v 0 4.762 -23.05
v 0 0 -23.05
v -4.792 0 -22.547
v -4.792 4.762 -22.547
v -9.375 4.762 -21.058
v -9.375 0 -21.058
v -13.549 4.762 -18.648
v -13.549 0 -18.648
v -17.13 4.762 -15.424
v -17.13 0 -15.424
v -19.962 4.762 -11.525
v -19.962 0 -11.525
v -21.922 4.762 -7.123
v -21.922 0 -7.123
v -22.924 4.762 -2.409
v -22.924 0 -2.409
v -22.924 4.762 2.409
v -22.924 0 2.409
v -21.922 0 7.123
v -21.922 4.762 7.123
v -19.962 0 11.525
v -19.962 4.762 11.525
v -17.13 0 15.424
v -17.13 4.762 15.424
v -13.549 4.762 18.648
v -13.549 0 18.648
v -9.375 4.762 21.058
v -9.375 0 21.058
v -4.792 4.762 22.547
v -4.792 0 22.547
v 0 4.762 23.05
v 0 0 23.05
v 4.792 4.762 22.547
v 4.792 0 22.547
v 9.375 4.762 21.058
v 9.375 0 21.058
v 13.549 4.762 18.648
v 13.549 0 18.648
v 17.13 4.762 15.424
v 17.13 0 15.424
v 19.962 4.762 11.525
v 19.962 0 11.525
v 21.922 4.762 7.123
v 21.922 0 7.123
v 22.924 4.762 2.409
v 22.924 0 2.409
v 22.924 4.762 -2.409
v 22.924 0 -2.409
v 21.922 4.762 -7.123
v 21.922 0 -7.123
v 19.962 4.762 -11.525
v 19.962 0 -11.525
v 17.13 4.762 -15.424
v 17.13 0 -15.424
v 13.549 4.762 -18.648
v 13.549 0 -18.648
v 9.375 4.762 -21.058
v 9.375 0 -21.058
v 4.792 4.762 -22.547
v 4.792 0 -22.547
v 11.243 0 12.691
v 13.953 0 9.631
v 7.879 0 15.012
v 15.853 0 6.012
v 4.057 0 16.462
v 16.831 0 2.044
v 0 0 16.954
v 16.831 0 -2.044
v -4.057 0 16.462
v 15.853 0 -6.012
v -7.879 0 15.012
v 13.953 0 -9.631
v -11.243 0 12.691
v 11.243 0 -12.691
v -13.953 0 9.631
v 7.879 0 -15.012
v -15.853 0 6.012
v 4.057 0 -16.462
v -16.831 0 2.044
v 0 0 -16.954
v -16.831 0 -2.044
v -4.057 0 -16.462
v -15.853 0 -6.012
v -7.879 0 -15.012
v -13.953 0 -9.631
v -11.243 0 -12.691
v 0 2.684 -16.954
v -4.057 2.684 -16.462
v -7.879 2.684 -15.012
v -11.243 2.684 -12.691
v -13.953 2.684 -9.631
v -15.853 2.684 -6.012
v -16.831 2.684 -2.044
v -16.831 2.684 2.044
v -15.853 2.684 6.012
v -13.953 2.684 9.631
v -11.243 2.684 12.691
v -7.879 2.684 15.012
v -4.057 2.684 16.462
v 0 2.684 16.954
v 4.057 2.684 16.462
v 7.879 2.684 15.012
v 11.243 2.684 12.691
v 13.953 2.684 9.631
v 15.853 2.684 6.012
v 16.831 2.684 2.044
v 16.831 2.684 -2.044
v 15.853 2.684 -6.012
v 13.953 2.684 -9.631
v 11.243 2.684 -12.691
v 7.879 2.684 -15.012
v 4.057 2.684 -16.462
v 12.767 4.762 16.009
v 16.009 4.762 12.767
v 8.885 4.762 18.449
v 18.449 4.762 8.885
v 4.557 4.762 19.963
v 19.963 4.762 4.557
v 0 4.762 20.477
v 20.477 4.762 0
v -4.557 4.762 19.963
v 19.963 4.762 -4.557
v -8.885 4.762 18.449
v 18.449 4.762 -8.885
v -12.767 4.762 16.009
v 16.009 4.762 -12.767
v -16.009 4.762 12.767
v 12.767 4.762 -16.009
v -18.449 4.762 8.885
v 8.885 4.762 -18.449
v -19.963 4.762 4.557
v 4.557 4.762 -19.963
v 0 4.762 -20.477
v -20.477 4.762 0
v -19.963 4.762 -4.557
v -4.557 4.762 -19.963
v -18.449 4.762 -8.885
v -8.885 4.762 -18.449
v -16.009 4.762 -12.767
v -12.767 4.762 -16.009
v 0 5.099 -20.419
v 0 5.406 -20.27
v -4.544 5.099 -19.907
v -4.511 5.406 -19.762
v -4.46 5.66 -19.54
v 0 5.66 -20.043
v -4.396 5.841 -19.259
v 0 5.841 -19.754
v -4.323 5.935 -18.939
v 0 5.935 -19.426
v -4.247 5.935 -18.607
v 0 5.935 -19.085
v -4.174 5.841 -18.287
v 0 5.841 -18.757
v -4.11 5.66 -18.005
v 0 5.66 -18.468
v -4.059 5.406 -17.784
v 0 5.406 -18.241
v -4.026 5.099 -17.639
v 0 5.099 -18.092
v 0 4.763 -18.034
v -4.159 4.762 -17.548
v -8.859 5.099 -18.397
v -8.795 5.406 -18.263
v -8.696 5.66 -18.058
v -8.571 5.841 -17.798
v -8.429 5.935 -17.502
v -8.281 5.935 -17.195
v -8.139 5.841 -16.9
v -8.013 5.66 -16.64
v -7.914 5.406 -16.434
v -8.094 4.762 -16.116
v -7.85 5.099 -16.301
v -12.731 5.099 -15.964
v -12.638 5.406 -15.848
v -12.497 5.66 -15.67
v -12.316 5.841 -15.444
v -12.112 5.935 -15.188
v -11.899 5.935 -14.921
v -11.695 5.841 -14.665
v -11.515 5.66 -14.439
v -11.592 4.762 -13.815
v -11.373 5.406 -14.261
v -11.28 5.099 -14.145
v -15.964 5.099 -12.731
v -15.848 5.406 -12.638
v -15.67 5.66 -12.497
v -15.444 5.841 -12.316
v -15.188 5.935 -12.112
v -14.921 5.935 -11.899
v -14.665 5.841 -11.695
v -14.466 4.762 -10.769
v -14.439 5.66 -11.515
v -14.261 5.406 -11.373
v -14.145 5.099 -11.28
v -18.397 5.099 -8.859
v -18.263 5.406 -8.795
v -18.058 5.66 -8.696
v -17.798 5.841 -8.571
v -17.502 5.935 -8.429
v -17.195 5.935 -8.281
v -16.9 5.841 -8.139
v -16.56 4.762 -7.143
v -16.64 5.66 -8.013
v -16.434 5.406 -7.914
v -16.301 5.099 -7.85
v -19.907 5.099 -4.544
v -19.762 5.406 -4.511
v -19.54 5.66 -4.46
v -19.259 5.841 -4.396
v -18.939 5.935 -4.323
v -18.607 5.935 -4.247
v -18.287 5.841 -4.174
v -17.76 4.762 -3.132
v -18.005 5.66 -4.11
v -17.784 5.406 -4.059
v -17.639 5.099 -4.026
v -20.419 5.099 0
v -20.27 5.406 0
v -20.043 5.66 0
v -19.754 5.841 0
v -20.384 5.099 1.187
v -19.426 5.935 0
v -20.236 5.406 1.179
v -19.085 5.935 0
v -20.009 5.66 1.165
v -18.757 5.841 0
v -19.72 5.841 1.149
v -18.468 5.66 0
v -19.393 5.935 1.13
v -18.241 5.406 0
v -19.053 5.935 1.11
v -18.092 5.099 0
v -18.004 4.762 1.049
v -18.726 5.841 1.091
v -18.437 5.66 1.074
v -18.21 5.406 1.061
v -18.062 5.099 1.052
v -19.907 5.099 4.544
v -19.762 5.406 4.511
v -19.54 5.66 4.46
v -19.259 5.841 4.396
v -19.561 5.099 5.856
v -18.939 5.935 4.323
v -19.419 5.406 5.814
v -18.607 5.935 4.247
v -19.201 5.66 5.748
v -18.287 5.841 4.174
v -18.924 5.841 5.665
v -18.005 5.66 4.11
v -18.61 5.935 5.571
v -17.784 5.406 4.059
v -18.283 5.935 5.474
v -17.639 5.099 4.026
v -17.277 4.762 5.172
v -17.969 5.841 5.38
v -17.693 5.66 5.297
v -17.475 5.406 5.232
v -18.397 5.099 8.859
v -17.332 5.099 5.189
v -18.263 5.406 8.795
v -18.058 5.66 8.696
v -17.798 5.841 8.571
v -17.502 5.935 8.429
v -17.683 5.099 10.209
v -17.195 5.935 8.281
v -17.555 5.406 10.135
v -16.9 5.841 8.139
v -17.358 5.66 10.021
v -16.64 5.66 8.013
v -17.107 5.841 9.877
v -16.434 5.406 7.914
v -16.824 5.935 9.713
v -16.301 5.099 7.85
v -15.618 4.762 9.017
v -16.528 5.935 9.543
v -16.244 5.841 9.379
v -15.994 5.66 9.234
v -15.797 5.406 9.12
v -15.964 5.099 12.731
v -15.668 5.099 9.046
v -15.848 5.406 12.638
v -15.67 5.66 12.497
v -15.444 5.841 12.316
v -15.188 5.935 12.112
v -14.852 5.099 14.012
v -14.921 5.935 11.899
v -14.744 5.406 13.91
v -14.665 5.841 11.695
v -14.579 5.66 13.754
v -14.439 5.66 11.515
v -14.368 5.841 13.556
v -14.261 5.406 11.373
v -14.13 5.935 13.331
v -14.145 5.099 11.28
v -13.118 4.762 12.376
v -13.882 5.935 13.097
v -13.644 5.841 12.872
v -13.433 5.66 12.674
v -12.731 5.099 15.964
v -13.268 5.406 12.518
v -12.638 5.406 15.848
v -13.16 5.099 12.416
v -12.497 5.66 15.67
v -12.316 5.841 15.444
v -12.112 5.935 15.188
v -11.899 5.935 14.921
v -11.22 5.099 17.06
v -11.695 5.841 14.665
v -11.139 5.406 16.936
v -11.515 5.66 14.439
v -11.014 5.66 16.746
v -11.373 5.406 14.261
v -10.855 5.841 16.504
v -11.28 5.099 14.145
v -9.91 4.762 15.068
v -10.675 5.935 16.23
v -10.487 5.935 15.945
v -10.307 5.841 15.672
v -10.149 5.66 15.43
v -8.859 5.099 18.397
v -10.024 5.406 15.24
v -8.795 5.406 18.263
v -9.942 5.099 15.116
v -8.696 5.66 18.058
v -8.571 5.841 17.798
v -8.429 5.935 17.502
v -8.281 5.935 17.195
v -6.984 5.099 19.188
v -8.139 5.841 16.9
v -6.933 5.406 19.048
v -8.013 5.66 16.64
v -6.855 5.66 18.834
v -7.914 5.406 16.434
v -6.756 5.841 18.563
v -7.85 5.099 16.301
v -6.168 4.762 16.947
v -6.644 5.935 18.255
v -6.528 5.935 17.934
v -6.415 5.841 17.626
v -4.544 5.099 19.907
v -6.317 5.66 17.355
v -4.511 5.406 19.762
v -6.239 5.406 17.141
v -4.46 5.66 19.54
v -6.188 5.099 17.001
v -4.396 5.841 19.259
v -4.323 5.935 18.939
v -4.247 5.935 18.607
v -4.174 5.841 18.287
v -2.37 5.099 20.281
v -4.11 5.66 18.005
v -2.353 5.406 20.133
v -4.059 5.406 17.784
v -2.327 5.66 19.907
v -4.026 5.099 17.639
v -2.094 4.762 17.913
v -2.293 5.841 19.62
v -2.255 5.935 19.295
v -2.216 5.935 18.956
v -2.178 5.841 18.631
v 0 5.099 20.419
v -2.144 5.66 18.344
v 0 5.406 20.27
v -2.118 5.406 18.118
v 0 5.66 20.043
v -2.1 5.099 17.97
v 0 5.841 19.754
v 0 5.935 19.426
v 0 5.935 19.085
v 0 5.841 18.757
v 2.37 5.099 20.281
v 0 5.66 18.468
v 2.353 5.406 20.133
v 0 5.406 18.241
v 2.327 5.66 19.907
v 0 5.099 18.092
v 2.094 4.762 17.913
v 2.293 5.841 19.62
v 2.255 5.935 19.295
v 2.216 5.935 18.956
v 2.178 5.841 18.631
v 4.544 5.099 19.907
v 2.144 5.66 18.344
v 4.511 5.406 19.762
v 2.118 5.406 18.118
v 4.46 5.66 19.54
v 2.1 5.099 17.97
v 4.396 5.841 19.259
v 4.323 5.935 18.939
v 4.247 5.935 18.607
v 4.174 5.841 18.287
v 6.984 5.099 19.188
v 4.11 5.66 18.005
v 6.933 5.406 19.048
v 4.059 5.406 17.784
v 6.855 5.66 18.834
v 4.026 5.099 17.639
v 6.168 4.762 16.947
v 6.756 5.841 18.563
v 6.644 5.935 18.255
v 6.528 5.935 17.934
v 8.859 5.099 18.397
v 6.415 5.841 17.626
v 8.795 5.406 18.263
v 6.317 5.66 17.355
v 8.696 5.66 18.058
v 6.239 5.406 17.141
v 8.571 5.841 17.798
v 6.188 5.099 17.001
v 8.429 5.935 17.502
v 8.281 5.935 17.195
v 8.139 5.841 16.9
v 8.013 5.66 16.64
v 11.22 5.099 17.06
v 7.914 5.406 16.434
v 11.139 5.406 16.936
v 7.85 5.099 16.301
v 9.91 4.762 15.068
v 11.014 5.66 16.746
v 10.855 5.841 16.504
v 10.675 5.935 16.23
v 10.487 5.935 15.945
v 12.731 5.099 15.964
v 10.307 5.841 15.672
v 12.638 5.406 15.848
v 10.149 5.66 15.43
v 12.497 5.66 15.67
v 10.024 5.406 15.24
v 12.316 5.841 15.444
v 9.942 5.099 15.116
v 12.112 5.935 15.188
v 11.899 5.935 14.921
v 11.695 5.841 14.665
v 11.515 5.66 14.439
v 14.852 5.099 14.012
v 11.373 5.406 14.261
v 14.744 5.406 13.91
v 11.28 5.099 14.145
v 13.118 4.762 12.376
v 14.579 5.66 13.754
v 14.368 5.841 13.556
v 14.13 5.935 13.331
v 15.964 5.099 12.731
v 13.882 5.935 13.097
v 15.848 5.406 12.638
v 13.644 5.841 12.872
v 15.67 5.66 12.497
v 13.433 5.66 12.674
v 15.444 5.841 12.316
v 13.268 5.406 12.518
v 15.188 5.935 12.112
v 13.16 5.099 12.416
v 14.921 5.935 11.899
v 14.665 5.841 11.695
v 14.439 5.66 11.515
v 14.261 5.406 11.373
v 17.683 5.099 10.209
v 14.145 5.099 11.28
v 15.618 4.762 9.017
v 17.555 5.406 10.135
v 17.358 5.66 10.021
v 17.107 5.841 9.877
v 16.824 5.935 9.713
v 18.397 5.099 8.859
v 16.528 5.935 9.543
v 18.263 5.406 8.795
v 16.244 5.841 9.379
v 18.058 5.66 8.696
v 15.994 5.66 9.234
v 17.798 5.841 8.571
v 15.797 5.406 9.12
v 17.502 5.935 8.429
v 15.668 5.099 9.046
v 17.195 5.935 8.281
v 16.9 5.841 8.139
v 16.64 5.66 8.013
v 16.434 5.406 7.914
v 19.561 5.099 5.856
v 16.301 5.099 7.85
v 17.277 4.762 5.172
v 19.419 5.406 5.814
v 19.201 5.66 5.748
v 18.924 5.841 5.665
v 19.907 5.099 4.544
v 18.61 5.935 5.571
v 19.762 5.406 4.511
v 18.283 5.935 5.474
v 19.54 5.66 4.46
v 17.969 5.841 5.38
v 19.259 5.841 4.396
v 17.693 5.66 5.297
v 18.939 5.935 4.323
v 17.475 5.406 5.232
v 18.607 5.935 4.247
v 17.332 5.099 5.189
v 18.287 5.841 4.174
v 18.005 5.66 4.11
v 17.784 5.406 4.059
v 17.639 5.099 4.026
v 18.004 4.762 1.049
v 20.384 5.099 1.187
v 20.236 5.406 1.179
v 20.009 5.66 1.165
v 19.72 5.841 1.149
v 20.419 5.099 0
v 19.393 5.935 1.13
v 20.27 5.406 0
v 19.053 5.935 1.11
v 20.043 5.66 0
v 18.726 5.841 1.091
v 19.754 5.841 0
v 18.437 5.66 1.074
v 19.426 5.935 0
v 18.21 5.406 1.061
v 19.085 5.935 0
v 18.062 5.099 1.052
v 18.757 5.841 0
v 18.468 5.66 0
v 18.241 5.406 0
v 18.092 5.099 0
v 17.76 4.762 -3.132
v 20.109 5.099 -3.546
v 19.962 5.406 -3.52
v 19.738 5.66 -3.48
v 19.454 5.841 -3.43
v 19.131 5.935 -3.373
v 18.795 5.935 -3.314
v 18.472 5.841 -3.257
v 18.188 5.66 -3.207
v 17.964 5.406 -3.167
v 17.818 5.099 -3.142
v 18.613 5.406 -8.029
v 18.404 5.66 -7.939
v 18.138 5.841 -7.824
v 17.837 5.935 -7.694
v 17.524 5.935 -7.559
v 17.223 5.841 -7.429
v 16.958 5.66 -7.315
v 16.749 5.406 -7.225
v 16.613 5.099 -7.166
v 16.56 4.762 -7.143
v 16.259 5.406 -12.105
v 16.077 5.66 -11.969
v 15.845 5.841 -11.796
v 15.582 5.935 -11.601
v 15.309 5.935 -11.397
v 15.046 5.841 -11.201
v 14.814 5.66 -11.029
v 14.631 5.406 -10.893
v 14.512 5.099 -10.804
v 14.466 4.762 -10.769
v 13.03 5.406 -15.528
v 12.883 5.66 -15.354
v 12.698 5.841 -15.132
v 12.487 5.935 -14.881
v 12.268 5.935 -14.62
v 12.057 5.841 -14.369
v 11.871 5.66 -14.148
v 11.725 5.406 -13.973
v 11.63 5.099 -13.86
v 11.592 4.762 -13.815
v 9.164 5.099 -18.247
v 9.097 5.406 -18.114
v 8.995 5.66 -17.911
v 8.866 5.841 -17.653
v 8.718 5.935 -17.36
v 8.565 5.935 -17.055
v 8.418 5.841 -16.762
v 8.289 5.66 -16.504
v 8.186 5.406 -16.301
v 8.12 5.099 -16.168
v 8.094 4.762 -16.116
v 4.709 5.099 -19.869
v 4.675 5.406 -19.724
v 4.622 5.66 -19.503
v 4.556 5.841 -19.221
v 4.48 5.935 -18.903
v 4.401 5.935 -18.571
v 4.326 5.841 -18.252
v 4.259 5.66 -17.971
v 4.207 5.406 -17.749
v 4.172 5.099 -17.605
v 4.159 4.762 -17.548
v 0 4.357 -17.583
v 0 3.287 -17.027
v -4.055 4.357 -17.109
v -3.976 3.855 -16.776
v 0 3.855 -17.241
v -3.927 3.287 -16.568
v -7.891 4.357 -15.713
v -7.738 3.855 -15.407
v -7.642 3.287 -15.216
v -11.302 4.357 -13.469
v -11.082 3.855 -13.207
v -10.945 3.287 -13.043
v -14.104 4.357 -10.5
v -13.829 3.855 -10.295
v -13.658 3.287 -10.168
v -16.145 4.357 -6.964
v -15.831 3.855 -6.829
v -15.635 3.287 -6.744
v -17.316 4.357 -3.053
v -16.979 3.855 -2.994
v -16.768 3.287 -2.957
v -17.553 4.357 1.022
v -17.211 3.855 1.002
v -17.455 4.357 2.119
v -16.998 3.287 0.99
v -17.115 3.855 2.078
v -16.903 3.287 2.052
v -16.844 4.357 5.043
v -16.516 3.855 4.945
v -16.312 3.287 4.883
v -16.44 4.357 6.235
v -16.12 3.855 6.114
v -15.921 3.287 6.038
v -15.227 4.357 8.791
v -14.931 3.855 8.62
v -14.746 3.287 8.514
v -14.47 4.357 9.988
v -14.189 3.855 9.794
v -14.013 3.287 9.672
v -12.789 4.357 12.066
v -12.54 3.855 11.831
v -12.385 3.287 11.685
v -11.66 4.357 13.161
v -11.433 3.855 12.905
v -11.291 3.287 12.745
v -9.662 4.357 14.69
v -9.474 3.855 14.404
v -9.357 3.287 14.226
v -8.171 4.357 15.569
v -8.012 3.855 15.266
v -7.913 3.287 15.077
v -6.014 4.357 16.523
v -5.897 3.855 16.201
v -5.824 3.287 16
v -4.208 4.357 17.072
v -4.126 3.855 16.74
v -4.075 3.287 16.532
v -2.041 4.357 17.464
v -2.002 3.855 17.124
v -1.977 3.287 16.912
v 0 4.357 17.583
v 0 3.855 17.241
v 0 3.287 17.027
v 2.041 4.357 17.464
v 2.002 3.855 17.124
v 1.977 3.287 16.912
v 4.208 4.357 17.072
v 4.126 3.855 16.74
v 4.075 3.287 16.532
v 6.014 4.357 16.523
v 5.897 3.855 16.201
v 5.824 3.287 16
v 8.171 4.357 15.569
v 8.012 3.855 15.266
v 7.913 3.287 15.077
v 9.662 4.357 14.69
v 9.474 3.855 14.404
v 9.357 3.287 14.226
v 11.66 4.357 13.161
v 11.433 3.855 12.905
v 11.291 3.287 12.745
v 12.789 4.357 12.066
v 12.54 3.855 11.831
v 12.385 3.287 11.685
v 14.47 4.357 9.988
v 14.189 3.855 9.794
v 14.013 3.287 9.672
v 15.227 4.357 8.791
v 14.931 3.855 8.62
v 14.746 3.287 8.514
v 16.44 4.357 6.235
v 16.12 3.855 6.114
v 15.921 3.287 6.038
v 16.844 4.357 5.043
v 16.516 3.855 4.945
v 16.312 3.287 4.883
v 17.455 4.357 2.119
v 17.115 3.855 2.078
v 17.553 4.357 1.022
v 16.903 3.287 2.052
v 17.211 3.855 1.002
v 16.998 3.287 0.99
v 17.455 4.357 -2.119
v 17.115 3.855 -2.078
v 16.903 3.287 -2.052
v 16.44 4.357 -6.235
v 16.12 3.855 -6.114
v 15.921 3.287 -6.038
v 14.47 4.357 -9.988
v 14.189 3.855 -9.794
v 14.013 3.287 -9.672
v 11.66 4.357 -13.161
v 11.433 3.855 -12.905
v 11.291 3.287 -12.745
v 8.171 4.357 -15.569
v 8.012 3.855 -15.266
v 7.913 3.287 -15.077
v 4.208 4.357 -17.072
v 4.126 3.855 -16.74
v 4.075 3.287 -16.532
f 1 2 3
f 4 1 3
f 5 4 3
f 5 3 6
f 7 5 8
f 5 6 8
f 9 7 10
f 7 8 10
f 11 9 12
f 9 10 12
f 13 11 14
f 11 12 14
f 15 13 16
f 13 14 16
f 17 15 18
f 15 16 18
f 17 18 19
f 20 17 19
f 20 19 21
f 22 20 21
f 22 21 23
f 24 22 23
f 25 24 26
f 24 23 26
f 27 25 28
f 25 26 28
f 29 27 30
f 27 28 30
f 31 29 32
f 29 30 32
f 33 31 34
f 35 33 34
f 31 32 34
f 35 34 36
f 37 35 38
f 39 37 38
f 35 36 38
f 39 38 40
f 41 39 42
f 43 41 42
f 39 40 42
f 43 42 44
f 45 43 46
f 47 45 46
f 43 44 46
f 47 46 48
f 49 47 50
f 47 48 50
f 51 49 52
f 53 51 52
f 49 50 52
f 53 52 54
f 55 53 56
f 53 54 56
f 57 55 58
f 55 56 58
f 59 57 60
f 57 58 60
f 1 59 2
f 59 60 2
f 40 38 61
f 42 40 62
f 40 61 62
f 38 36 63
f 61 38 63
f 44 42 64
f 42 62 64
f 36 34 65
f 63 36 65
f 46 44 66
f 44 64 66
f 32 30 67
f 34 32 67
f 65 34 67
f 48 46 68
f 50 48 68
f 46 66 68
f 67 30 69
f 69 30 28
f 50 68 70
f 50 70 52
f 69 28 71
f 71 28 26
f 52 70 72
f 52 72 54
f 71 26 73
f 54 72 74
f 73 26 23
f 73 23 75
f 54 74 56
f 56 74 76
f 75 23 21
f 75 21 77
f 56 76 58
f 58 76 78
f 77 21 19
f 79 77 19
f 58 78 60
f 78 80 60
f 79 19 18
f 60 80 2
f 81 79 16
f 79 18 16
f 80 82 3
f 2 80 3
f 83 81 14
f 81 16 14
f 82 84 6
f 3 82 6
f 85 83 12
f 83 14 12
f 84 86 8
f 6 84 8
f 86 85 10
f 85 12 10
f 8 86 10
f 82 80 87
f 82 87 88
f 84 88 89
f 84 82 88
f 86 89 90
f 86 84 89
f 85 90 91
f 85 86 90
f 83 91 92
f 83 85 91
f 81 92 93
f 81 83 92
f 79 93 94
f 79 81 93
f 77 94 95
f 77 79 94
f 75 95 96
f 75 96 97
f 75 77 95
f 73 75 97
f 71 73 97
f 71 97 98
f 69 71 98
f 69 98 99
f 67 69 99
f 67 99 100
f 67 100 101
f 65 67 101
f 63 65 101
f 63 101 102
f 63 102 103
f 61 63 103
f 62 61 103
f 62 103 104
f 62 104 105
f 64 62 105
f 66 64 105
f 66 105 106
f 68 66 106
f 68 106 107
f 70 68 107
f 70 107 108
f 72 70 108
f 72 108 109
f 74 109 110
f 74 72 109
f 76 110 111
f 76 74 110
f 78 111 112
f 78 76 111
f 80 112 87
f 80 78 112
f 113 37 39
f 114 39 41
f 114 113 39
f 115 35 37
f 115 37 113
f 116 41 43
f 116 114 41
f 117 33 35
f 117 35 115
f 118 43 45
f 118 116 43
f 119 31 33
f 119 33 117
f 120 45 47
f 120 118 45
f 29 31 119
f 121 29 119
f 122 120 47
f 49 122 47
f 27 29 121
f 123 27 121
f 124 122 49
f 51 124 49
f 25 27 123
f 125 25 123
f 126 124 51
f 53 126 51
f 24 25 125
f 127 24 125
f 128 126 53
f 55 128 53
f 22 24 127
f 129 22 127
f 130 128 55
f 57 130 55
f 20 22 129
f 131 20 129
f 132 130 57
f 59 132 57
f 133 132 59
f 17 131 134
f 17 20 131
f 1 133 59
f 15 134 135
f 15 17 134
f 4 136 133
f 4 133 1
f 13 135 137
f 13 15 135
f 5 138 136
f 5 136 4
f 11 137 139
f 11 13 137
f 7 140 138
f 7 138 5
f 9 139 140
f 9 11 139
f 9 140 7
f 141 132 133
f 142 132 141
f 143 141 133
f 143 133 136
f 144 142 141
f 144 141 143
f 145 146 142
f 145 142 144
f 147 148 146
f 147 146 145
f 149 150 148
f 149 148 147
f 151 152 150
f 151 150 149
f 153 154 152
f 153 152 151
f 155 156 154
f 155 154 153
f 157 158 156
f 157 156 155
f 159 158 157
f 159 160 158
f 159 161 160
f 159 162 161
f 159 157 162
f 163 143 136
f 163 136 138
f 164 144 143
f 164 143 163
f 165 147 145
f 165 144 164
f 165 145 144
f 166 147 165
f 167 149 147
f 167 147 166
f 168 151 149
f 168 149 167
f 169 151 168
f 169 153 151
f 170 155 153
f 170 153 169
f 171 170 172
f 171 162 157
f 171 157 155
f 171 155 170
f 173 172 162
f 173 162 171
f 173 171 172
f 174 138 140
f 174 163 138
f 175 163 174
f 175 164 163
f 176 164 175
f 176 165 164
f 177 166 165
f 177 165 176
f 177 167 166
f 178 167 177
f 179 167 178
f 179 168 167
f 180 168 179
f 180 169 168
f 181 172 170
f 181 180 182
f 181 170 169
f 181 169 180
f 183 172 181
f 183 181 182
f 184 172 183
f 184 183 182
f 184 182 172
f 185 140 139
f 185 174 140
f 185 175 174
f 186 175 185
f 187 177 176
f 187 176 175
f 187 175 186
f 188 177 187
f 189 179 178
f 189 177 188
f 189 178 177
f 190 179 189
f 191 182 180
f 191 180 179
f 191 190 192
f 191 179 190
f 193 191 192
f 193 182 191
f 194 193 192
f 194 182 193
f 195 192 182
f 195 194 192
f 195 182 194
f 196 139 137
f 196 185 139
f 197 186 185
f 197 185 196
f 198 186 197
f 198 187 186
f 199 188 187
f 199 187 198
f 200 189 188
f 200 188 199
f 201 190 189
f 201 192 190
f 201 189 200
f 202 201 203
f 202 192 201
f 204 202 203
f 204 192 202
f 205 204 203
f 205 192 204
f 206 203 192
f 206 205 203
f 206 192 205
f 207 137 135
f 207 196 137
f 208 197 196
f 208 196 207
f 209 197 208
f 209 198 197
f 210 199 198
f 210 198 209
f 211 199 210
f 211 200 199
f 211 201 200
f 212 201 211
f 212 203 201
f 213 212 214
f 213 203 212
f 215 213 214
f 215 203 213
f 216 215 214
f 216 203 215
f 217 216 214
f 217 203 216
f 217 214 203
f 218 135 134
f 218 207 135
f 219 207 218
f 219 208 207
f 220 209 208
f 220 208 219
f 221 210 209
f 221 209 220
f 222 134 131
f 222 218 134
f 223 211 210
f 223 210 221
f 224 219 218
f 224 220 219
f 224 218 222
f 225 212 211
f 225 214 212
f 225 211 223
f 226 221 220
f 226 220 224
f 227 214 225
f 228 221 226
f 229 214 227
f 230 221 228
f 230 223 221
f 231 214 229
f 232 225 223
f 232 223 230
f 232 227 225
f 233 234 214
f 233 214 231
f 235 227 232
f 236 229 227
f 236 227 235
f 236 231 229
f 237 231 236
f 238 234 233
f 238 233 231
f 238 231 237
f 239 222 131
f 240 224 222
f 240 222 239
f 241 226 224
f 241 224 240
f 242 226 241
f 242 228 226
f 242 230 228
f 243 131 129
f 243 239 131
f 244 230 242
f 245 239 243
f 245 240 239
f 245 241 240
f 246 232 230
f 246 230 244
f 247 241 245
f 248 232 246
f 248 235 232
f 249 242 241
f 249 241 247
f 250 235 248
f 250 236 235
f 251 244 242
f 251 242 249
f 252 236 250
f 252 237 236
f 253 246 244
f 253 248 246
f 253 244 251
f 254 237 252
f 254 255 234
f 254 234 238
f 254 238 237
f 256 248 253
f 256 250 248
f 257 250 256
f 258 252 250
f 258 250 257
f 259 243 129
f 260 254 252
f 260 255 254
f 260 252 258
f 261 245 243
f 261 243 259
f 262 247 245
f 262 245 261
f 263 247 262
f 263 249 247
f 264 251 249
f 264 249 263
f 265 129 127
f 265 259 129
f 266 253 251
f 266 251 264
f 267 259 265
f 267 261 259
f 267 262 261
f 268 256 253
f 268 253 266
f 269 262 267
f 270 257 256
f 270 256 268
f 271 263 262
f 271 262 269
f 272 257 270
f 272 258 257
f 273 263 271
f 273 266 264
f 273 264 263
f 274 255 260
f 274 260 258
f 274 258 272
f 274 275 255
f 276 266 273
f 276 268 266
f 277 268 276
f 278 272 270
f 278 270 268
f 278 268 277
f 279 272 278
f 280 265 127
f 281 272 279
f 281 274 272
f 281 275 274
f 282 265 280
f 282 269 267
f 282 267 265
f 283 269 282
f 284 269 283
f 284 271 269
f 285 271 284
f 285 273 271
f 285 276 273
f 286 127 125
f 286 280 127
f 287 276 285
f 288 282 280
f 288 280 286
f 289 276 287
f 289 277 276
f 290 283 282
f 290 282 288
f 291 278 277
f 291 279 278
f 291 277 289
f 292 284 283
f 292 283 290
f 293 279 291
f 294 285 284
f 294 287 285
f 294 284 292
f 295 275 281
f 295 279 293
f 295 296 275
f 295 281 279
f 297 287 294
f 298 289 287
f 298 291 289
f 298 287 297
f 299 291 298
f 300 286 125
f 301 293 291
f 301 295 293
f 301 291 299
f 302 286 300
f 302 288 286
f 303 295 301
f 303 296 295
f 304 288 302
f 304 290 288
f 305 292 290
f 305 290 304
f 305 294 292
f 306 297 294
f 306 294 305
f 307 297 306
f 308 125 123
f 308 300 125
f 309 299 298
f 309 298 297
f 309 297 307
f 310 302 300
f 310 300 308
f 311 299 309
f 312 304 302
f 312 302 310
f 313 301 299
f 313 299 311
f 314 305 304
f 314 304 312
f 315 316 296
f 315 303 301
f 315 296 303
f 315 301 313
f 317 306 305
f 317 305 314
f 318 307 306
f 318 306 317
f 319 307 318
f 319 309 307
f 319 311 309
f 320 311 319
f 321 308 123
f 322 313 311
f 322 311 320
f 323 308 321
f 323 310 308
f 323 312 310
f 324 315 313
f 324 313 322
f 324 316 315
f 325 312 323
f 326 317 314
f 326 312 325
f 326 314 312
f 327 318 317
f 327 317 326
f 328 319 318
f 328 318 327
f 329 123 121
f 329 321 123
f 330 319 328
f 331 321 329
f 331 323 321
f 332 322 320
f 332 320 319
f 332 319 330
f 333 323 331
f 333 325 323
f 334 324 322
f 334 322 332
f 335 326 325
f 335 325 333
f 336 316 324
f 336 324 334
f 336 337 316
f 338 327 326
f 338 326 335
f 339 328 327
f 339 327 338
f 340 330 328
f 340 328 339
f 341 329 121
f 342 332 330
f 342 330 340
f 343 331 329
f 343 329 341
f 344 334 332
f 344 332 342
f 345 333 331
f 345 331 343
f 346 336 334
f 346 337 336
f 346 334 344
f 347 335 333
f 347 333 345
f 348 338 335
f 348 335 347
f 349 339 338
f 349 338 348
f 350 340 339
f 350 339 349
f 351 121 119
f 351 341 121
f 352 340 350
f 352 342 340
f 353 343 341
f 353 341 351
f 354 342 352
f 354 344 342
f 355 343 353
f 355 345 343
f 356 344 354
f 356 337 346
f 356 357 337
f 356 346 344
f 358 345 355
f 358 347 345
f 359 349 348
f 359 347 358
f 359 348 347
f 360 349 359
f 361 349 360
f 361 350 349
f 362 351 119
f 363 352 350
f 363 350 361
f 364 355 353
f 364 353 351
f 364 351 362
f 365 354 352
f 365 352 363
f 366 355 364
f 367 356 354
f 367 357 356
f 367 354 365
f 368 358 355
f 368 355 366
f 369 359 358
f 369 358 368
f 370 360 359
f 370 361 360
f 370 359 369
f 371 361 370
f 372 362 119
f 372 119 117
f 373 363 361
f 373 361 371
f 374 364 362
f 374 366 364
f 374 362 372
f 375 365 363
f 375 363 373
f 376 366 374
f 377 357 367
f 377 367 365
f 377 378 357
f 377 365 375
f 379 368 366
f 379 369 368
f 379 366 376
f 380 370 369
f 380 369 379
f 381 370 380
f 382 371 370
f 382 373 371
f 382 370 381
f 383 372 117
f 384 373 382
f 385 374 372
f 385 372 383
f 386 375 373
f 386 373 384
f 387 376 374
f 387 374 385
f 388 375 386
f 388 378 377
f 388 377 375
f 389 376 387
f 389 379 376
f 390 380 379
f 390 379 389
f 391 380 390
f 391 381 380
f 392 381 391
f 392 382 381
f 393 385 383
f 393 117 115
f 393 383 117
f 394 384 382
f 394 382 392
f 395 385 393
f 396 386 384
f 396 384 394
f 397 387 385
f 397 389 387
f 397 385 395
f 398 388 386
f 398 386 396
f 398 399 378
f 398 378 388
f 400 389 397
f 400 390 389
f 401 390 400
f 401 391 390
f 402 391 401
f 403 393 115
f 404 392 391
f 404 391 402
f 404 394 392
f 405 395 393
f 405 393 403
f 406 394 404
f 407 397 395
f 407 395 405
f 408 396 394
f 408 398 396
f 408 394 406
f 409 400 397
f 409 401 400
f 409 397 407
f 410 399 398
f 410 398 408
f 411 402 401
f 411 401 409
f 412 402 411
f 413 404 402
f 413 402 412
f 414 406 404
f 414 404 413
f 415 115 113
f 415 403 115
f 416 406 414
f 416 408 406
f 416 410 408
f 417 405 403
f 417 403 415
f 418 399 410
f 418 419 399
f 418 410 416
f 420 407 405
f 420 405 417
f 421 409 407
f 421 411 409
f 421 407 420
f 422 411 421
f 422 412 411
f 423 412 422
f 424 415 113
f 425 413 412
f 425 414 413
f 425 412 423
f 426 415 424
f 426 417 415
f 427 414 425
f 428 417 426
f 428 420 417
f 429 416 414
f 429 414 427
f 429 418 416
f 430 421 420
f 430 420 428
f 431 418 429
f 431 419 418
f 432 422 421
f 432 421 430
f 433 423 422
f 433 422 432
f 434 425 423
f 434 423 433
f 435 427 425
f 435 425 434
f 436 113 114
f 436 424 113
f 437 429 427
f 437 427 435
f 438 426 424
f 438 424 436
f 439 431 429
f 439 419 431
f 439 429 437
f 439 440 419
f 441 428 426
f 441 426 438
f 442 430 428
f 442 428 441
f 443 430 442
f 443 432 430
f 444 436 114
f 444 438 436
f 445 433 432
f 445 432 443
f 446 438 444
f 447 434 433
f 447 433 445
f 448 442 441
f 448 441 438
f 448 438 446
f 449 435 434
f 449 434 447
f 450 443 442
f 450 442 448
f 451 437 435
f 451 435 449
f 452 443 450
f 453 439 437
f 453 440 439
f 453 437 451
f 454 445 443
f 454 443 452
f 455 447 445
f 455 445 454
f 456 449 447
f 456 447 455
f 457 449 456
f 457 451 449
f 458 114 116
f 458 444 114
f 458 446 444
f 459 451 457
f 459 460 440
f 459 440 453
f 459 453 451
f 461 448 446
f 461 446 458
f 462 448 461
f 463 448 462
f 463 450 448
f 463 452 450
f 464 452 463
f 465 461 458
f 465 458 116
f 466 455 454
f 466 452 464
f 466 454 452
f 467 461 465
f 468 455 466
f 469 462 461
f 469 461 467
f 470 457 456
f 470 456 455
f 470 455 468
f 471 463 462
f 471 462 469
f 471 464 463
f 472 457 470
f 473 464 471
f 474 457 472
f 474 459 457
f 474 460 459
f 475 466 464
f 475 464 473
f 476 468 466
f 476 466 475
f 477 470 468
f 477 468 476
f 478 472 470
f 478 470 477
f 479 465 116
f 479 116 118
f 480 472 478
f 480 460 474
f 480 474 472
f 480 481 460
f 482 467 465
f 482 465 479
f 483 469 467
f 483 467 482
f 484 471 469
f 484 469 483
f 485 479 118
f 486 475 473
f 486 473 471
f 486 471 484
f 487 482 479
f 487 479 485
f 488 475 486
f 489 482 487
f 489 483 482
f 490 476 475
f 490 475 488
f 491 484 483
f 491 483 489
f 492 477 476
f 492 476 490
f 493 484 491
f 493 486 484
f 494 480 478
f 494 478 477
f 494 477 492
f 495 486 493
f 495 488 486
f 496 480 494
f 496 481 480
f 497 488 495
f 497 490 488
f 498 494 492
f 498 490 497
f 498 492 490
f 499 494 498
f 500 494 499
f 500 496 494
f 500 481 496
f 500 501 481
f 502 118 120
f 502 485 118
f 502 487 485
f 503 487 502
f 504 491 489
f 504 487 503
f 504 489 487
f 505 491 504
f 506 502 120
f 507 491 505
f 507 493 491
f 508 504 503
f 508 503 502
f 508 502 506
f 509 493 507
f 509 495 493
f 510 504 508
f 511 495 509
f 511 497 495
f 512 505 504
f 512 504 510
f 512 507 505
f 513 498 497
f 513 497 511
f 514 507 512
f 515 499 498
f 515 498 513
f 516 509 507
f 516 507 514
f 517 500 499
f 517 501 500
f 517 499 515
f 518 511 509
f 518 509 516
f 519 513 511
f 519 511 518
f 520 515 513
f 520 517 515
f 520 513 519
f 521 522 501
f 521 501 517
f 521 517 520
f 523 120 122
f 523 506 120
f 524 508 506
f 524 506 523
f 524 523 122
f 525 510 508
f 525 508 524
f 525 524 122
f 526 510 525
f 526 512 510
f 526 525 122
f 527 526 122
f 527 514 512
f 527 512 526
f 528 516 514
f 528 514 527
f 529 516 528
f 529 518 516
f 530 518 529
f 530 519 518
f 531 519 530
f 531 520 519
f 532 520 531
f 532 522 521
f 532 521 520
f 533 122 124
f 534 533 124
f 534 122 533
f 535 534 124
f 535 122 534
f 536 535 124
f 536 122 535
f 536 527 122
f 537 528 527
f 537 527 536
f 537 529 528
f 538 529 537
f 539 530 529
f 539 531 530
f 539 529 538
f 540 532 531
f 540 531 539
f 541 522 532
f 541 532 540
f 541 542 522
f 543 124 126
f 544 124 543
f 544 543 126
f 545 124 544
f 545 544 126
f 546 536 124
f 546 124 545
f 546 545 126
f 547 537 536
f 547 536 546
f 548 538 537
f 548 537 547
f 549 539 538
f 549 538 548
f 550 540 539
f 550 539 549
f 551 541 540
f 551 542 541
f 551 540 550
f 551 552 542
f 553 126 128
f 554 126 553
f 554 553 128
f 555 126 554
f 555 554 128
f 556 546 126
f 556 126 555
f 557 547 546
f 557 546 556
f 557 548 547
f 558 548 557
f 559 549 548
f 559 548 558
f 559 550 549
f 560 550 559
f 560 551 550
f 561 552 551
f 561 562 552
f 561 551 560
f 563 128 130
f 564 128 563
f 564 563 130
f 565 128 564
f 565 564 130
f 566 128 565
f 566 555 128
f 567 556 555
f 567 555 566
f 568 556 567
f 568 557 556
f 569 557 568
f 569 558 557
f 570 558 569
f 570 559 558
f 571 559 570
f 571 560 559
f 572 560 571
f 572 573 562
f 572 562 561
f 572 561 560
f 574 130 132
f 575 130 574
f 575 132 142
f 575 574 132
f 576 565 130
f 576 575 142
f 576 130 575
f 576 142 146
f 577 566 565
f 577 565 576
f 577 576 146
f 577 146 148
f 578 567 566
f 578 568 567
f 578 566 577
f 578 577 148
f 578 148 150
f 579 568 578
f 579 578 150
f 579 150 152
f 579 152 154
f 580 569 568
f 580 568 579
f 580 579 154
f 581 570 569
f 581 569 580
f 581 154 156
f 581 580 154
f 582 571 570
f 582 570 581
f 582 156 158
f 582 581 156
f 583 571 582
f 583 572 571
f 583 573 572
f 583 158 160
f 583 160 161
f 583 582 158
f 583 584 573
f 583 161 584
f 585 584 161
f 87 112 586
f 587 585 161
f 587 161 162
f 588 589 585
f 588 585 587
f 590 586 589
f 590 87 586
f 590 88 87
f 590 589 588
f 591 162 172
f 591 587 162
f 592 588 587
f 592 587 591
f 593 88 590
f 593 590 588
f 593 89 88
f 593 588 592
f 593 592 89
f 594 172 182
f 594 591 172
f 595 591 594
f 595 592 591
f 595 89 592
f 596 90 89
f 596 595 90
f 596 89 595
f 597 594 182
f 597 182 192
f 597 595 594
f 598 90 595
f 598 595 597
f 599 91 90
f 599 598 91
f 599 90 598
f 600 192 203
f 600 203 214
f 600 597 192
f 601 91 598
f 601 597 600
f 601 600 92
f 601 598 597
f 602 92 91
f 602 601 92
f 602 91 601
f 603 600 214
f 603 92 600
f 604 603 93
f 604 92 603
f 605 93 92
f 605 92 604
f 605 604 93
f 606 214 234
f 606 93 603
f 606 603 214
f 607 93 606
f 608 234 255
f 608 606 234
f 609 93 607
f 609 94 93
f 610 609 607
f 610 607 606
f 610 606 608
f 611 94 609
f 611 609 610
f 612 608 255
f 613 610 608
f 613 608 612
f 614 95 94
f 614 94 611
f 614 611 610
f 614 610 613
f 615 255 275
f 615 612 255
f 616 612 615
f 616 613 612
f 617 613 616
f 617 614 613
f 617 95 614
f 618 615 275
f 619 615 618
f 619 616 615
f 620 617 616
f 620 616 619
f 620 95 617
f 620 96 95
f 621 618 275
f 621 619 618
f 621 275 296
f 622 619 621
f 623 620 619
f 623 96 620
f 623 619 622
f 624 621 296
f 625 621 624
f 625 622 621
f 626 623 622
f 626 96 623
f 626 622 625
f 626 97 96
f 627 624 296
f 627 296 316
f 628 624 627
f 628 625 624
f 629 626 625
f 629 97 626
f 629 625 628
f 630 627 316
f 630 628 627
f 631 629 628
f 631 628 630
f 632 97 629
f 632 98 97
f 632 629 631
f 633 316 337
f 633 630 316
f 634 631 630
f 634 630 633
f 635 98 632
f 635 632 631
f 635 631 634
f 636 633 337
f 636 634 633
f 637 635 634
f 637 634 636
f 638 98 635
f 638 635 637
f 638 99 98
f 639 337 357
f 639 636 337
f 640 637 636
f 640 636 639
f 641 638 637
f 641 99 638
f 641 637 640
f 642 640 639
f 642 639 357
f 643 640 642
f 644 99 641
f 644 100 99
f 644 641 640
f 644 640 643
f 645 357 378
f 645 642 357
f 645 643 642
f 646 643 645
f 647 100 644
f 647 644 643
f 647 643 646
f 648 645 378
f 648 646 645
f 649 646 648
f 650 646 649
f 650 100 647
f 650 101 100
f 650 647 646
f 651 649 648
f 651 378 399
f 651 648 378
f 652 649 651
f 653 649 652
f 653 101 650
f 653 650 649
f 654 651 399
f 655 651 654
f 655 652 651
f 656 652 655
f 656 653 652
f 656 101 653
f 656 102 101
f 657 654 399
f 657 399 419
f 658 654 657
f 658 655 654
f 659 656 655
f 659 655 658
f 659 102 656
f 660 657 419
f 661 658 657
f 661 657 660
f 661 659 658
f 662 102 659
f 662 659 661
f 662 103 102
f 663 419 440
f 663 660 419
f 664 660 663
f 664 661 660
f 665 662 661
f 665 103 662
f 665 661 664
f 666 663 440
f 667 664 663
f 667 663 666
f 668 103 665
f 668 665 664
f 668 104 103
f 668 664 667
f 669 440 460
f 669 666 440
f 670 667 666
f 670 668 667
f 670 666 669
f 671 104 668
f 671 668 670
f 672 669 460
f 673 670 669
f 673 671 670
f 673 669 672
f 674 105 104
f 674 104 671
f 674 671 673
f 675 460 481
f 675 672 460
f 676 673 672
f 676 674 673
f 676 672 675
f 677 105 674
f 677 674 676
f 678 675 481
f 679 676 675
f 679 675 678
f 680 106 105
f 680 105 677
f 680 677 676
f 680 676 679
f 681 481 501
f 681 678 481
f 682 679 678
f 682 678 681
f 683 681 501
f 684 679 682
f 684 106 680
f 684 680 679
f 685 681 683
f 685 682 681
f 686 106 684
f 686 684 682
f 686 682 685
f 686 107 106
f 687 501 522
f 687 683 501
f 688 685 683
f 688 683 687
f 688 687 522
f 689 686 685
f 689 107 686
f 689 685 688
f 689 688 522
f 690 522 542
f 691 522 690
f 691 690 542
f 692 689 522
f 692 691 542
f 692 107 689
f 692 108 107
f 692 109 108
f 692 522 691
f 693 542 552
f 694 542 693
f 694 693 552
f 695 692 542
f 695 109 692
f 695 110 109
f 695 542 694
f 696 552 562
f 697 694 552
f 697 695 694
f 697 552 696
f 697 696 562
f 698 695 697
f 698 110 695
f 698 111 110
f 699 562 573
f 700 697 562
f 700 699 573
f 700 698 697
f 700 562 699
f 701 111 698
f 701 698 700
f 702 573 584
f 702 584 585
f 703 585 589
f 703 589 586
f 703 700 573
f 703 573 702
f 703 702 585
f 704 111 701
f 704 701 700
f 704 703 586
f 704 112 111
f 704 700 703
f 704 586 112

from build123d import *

# Parameters (mm, degrees)
SKETCH1_R           = 23.0505
SKETCH1_R_2         = 16.9545
BOSS_EXTRUDE1_DEPTH = 4.7625
FILLET1_R           = 2.54


with BuildPart() as part:
    # Sketch1 → Boss-Extrude1 (new body)
    with BuildSketch(Plane(origin=(0, 0, 0), x_dir=(1, 0, 0), z_dir=(0, 1, 0))):
        with Locations(Location((0, 0, 0), (0, 0, 90))):
            Circle(SKETCH1_R)
        with Locations(Location((0, 0, 0), (0, 0, 90))):
            Circle(SKETCH1_R_2, mode=Mode.SUBTRACT)
    extrude(amount=BOSS_EXTRUDE1_DEPTH)

    # Sketch2 → Revolve1 (revolve)
    with BuildSketch(Plane.XY, mode=Mode.PRIVATE) as revolve1_sk:
        with BuildLine():
            Line((18.034, 4.710412046), (20.477314517, 4.739986951))
            ThreePointArc((20.477314517, 4.739986951), (19.240869806, 5.946856757), (18.034, 4.710412046))
        make_face()
    revolve(revolve1_sk.sketch.rotate(Axis((0, 0, 0), (0, 1, 0)), 90), axis=Axis((0, 0, 0), (0, 1, 0)))

    # Fillet1
    # the kernel refuses this fillet: 2.54 mm, written as the material it takes off along each edge
    with BuildSketch(Plane(origin=(0, 4.7625, 0), x_dir=(0, 0, -1), z_dir=(1, 0, 0))) as fillet1_piece_1:
        with BuildLine():
            CenterArc((19.4945, -2.078446948), FILLET1_R, 125.086398031, 54.913601969)
            Line((18.03448004, 0), (18.005279641, 0.041568939))
            ThreePointArc((18.005279641, 0.041568939), (17.49449002, 0.0508), (16.9545, 0.0508))
            Line((16.9545, 0.0508), (16.9037, 0))
            Line((16.9037, 0), (16.9037, -2.078446948))
            Line((16.9037, -2.078446948), (16.9545, -2.078446948))
        make_face()
    revolve(axis=Axis((0, 4.7625, 0), (0, 1, 0)), mode=Mode.SUBTRACT)


solid = part.part
